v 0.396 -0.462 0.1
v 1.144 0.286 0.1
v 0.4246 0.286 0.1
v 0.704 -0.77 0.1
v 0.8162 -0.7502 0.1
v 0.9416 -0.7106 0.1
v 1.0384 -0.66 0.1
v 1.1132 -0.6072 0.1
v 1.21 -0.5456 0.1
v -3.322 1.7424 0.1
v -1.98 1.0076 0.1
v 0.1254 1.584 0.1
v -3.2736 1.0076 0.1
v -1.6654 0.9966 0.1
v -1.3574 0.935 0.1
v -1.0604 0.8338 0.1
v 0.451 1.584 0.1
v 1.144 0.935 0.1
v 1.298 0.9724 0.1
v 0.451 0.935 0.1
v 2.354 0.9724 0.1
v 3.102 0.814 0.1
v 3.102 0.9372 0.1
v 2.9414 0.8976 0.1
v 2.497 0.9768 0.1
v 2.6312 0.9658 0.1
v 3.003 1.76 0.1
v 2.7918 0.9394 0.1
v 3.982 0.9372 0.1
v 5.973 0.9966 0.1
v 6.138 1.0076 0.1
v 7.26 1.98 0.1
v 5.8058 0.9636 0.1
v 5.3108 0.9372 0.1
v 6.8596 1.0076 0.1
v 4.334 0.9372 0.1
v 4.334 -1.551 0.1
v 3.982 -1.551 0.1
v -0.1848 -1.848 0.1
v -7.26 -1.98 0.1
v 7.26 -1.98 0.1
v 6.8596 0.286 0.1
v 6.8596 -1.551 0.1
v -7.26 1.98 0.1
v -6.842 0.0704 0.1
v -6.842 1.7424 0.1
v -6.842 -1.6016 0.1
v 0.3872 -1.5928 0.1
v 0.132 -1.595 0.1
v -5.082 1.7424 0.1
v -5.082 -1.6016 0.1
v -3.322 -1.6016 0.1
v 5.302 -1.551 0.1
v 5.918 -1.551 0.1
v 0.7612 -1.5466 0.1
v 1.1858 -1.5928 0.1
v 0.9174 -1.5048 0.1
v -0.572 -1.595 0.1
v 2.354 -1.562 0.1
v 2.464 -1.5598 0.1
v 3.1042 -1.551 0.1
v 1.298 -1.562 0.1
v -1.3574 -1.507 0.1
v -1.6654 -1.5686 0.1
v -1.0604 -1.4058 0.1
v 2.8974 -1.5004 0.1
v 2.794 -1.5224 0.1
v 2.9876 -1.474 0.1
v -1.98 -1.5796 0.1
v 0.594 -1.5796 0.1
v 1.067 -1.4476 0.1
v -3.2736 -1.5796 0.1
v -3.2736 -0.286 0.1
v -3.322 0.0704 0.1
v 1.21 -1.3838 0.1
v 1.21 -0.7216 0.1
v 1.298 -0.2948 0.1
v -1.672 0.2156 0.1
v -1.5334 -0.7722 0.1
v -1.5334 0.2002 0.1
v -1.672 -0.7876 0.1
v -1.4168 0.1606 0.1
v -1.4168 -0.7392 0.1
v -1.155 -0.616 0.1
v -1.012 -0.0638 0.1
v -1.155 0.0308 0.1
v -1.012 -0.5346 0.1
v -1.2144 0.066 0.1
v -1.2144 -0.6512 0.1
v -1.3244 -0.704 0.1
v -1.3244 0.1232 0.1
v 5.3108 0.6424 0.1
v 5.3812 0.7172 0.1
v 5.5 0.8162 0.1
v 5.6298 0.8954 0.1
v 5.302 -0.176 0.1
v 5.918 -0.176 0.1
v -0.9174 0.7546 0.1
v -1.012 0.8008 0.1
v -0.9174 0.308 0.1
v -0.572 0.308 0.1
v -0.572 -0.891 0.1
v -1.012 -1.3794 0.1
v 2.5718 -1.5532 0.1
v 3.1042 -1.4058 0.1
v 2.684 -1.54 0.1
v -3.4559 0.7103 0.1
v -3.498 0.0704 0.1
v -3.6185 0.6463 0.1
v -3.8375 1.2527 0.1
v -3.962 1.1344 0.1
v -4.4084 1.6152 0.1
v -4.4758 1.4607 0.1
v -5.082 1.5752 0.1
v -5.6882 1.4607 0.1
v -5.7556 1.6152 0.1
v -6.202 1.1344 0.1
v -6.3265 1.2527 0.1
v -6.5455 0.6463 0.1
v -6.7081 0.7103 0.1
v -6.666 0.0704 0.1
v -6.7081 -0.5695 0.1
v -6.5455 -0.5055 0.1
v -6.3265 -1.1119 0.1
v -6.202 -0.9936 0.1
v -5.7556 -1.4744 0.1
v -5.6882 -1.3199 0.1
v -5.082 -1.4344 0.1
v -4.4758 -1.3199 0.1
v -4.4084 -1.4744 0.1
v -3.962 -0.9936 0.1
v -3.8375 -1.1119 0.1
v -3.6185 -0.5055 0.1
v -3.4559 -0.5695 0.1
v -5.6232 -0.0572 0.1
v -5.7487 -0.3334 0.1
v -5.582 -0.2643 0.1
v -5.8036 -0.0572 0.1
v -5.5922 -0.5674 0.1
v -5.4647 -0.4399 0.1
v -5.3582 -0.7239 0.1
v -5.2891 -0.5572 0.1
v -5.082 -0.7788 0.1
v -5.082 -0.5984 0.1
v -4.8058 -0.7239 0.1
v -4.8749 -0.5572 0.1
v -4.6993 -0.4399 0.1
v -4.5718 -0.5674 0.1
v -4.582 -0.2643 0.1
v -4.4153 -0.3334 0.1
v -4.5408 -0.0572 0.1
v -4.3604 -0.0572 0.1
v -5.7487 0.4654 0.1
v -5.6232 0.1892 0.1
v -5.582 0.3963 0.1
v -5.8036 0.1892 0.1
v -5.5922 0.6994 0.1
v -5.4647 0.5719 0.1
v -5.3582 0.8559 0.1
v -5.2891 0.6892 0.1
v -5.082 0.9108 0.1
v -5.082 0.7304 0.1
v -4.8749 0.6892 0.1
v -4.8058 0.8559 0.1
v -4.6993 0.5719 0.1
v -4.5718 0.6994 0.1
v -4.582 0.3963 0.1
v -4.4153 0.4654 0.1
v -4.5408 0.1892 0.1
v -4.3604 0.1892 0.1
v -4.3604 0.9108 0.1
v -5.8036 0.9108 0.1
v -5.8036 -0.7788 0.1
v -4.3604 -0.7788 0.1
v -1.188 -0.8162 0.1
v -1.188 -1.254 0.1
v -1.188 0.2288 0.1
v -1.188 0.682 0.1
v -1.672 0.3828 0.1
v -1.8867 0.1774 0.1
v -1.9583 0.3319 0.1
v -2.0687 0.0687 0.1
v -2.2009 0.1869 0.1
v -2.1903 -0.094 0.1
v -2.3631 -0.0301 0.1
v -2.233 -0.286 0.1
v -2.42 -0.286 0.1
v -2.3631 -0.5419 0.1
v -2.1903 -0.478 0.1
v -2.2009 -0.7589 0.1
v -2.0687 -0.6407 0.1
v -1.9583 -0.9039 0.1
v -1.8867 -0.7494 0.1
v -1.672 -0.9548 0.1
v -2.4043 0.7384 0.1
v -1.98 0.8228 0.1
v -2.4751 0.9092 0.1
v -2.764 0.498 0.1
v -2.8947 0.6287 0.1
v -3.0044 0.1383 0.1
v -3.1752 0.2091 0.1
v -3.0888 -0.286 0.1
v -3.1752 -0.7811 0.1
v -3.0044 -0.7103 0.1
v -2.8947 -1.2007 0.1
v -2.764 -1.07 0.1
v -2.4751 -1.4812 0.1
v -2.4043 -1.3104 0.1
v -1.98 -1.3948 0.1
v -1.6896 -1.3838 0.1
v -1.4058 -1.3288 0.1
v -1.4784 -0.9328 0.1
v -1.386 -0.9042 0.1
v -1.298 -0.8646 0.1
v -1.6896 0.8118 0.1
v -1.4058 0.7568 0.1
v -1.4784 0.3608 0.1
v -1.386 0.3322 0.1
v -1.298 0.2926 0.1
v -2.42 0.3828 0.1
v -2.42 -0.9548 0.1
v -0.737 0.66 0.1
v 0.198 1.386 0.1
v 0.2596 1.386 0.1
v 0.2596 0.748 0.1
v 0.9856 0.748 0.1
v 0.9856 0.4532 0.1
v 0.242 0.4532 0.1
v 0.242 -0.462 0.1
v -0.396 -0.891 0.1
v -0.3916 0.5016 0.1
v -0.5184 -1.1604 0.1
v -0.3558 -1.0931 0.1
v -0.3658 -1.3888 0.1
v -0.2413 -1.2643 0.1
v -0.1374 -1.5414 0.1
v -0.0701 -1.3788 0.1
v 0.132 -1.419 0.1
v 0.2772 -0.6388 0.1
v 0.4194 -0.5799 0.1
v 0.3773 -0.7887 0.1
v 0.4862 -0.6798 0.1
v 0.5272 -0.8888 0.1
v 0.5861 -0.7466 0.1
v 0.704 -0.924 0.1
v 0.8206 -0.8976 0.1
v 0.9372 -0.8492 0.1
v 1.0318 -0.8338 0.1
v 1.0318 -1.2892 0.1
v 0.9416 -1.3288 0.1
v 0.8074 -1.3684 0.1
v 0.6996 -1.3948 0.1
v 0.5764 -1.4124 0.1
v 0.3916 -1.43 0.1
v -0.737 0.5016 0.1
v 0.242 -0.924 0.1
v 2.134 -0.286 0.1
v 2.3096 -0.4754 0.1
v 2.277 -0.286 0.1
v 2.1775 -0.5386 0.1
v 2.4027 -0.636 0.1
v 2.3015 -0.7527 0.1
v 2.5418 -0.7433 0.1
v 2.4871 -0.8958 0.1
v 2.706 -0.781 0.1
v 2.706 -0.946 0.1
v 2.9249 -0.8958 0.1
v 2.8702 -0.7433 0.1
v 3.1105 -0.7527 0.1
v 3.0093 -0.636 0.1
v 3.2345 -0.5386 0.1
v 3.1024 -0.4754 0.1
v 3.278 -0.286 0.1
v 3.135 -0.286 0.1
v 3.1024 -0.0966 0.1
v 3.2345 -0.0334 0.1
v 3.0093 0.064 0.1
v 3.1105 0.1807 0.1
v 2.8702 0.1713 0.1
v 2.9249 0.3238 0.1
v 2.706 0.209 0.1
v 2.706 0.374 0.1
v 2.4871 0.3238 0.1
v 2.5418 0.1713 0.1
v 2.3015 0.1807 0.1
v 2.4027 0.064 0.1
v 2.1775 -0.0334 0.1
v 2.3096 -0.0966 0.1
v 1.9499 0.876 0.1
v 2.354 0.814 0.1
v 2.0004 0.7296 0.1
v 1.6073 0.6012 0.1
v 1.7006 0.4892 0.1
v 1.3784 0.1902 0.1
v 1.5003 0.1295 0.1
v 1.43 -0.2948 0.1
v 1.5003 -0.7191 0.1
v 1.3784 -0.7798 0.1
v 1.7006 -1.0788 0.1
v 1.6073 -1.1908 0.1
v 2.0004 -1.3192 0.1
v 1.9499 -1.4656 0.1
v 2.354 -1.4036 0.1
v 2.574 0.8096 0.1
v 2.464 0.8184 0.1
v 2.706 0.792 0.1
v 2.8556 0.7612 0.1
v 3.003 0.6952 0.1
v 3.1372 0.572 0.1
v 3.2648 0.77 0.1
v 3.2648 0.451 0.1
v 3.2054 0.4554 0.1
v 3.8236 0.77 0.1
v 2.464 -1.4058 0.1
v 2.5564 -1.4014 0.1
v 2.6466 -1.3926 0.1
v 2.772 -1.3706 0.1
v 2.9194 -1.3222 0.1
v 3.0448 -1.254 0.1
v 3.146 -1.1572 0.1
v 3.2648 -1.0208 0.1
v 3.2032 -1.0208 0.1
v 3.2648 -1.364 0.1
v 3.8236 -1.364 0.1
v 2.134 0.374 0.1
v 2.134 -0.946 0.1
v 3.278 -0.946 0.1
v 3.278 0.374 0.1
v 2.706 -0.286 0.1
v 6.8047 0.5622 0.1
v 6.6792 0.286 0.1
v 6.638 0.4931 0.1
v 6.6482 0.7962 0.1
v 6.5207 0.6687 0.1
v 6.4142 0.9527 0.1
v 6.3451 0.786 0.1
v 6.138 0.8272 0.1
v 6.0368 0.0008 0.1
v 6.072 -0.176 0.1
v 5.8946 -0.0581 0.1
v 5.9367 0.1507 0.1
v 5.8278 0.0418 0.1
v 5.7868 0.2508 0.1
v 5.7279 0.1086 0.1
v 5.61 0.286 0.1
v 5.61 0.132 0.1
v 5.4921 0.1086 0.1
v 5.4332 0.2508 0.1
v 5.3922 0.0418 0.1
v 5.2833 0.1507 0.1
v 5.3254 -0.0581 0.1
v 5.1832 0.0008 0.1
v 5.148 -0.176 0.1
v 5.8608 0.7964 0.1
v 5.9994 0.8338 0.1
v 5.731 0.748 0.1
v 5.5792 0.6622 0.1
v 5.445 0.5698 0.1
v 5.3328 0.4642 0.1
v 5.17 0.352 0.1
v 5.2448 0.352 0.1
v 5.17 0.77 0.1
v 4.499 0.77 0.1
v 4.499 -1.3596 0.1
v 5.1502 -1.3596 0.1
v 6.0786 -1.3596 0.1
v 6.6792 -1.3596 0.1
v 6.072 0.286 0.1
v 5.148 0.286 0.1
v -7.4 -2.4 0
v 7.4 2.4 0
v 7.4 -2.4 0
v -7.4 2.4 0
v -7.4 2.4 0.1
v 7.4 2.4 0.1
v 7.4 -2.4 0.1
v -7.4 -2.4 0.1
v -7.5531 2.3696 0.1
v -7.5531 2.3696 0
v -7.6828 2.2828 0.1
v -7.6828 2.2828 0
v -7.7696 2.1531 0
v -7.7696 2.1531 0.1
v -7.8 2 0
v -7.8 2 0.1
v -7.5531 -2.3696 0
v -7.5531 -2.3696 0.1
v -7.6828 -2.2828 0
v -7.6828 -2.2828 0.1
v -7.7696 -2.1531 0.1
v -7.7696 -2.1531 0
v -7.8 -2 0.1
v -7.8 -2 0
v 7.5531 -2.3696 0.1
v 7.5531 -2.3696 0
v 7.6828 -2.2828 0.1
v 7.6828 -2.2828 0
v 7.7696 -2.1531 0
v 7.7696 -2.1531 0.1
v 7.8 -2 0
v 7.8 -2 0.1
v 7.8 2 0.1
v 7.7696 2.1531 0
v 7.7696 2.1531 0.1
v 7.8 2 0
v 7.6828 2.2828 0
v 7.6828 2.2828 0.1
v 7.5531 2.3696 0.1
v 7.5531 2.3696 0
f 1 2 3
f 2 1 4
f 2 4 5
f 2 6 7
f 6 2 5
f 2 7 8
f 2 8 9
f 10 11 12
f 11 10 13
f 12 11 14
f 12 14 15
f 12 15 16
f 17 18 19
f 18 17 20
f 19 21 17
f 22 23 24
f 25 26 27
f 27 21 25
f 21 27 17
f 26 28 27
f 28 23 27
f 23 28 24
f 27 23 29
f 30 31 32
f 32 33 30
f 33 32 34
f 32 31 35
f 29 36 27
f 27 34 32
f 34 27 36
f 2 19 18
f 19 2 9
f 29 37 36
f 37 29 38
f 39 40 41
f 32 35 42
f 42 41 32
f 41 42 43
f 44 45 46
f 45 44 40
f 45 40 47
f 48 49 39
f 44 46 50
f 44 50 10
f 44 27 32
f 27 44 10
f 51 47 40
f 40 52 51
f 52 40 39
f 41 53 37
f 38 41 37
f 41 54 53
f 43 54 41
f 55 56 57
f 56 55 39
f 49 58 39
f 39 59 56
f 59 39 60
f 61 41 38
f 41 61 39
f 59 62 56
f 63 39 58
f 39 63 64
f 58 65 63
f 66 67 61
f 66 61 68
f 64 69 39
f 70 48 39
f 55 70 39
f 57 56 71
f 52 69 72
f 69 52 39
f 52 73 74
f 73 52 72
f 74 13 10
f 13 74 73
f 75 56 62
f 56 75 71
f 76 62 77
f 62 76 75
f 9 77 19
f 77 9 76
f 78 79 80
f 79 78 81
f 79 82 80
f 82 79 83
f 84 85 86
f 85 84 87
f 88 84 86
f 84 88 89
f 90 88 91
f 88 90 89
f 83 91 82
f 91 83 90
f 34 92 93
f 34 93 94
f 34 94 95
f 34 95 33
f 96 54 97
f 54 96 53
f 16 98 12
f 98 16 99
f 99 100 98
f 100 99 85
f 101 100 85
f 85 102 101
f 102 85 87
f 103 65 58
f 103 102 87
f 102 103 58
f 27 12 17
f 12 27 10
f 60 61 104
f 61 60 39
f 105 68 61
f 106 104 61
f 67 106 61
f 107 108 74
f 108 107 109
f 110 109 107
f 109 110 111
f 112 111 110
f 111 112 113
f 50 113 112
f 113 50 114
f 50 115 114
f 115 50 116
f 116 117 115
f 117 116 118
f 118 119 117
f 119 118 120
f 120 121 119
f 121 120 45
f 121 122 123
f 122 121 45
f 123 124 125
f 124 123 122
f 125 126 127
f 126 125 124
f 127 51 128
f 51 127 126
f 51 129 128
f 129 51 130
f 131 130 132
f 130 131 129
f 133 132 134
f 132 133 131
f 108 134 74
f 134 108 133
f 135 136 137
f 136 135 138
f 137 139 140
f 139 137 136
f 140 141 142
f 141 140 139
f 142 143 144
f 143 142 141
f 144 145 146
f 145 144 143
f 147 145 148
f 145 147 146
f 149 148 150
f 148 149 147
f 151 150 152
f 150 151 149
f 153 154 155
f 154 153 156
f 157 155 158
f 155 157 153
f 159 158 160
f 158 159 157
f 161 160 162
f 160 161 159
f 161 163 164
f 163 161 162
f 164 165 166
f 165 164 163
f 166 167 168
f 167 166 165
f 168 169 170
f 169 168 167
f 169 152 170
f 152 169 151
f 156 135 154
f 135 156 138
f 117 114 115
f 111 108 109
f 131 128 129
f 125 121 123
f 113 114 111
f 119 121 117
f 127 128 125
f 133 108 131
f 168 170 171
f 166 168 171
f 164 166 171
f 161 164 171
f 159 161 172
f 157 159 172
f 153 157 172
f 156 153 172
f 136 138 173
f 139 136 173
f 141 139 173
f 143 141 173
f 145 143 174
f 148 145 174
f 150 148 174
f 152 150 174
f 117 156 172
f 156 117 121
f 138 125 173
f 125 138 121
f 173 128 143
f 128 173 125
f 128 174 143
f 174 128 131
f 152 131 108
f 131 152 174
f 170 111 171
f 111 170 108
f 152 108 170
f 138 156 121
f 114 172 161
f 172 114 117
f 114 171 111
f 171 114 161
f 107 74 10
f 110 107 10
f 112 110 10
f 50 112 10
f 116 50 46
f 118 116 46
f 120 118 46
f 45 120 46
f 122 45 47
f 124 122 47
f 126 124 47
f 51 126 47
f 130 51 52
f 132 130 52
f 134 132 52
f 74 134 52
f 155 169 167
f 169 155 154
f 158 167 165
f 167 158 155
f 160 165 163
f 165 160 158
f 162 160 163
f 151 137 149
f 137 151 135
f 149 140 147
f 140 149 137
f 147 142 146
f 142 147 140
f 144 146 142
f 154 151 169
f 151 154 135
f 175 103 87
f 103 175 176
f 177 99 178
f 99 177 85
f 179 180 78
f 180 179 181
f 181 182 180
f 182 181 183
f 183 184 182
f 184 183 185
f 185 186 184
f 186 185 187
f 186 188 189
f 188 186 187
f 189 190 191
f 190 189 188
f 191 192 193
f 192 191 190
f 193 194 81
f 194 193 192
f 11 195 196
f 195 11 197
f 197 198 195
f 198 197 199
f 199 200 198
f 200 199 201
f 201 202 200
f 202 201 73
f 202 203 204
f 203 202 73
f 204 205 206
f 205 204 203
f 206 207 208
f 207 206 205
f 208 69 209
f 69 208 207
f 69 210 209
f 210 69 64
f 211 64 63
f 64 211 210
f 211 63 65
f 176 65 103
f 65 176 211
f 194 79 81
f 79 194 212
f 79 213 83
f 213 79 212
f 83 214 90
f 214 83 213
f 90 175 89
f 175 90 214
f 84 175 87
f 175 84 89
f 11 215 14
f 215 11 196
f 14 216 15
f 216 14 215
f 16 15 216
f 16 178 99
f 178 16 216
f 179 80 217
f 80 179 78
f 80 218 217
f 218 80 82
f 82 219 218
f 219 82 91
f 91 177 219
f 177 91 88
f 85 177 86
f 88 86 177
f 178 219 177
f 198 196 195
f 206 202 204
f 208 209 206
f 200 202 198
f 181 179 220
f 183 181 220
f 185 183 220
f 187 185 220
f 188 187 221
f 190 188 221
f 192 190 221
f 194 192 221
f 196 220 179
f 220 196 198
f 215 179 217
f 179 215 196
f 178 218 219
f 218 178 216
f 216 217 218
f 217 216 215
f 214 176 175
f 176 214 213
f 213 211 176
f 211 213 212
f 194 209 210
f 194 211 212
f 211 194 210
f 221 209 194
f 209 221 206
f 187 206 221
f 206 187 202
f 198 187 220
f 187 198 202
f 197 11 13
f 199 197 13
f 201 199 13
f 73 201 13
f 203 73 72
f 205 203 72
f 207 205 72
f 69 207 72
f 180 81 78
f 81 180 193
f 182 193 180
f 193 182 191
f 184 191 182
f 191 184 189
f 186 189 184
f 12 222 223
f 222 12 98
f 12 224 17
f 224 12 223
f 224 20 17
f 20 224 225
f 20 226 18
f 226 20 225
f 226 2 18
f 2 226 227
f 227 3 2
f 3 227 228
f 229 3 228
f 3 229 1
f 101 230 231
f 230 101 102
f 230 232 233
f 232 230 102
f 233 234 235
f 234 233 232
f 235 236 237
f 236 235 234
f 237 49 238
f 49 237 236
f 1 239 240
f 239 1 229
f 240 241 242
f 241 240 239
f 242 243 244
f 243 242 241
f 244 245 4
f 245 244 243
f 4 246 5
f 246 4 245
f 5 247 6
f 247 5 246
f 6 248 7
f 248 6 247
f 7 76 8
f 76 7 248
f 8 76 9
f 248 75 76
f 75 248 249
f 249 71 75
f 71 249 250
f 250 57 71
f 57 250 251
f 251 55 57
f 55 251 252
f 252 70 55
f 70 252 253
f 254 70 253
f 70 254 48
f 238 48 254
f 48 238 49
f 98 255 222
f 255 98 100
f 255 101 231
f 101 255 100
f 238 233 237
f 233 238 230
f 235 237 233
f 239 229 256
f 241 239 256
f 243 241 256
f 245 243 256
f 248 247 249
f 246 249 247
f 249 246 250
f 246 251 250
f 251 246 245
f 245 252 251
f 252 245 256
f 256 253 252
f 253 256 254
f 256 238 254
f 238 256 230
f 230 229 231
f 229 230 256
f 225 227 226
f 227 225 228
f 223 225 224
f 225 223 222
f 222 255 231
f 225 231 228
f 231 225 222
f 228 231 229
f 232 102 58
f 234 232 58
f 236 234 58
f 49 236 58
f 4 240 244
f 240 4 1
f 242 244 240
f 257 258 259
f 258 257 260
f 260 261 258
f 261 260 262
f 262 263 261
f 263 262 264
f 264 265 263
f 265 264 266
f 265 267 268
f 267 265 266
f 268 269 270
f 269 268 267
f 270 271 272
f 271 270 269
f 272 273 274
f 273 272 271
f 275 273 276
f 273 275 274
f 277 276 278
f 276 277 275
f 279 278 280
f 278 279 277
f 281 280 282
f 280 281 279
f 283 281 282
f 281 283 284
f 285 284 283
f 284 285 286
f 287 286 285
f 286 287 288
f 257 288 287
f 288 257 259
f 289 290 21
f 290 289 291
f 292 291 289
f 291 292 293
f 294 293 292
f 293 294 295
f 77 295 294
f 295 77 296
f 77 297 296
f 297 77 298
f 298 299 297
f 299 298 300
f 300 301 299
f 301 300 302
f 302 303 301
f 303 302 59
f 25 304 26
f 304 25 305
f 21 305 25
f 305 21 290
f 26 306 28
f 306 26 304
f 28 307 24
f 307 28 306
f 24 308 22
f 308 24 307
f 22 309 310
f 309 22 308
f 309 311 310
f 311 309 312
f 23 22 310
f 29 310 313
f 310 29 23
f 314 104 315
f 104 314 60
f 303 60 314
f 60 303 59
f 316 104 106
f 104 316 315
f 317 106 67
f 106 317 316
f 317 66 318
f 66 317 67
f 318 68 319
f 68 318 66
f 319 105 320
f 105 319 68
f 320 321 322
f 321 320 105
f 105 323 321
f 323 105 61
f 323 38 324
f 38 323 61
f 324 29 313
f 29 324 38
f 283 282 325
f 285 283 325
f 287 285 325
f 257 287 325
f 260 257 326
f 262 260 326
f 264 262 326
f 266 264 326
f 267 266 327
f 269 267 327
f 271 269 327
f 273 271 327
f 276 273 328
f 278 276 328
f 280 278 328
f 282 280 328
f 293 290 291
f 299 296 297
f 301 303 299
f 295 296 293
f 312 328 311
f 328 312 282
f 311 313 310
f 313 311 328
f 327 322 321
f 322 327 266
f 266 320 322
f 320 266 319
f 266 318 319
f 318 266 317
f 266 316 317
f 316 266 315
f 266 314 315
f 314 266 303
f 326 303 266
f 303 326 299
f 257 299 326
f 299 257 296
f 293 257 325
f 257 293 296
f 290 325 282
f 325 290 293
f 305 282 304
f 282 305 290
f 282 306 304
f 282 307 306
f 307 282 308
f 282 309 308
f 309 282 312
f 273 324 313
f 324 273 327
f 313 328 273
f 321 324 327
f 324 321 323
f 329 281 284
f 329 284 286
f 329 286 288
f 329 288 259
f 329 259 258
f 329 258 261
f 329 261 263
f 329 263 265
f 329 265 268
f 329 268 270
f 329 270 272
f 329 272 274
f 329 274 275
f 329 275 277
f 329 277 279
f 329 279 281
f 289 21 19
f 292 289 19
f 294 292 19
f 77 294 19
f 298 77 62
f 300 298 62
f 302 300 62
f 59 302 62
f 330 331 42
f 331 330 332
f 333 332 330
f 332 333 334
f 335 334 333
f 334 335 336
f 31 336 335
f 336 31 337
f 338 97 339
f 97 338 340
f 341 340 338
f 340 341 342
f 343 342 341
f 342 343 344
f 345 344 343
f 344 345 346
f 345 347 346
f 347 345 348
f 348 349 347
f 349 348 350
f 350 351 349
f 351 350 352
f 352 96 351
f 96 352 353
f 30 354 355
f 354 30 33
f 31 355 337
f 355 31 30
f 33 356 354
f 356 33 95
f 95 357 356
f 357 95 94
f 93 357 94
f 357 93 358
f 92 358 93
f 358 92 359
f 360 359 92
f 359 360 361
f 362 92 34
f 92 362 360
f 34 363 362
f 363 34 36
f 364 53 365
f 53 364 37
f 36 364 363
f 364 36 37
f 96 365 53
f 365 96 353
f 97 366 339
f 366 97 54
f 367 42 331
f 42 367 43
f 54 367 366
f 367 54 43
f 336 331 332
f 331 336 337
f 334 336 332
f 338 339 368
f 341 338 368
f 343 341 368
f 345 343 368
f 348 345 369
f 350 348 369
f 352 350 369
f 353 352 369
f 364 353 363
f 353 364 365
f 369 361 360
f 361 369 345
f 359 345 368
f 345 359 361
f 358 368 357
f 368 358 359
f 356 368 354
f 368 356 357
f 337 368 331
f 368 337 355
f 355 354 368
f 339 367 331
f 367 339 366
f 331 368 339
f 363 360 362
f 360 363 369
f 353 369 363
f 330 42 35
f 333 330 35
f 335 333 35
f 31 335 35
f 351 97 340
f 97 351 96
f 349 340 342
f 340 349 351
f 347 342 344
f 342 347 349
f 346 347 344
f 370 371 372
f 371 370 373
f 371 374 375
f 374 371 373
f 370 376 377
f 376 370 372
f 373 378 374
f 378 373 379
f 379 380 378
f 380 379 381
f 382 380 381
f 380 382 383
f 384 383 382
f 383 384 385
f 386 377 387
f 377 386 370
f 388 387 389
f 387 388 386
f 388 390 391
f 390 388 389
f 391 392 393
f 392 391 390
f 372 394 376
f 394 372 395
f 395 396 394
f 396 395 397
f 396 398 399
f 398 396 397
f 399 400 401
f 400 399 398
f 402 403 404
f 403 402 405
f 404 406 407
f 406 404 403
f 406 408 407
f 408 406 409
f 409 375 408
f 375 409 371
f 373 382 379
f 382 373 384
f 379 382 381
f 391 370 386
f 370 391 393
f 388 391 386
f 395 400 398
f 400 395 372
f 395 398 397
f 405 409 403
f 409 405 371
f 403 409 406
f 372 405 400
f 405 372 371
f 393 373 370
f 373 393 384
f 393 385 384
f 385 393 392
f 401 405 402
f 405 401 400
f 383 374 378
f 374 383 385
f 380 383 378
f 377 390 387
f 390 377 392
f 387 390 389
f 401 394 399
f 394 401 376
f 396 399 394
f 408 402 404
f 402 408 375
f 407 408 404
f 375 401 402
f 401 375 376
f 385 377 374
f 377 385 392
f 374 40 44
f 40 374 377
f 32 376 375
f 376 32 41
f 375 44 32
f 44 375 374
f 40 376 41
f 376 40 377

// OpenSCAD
use <../lib.scad>
use <../p/1-4chrd.scad>
use <../p/1-4cyli.scad>
use <../p/box3u12.scad>
use <../p/logo-octantext.scad>
$fa=1; $fs=0.2;
function ldraw_lib__4121723l(realsolid=false) = [
// 0 Sticker  0.65 x  1.95 with "Octan" Lettering with Medium-Bold Borders
// 0 Name: 4121723l.dat
// 0 Author: Ulrich Röder [UR]
// 0 !LDRAW_ORG Part UPDATE 2022-02
// 0 !LICENSE Licensed under CC BY 2.0 and CC BY 4.0 : see CAreadme.txt
// 
// 0 BFC CERTIFY CCW
  [0,"BFC","CERTIFY"],
  [0,"BFC","CCW"],
// 
// 0 !KEYWORDS Model Team, Racing Truck, Set 5563
// 
// 0 !HISTORY 2022-03-06 [PTadmin] Official Update 2022-02
// 
// 
// 1 16 0 -.25 0 0.55 0 0 0 1 0 0 0 0.55 logo-octantext.dat
  [1,16,0,-.25,0,0.55,0,0,0,1,0,0,0,0.55, ldraw_lib__logo_octantext(realsolid)],
// 
// 0 // Body
// 1 16 0 -0.25 0 18.5 0 0 0 0.25 0 0 0 6 box3u12.dat
  [1,16,0,-0.25,0,18.5,0,0,0,0.25,0,0,0,6, ldraw_lib__box3u12(realsolid)],
// 1 16 -18.5 0 5 0 0 -1 0 -.25 0 1 0 0 1-4cyli.dat
  [1,16,-18.5,0,5,0,0,-1,0,-.25,0,1,0,0, ldraw_lib__1_4cyli(realsolid)],
// 1 16 -18.5 0 -5 0 0 -1 0 -.25 0 -1 0 0 1-4cyli.dat
  [1,16,-18.5,0,-5,0,0,-1,0,-.25,0,-1,0,0, ldraw_lib__1_4cyli(realsolid)],
// 1 16 18.5 0 -5 0 0 1 0 -.25 0 -1 0 0 1-4cyli.dat
  [1,16,18.5,0,-5,0,0,1,0,-.25,0,-1,0,0, ldraw_lib__1_4cyli(realsolid)],
// 1 16 18.5 0 5 1 0 0 0 -.25 0 0 0 1 1-4cyli.dat
  [1,16,18.5,0,5,1,0,0,0,-.25,0,0,0,1, ldraw_lib__1_4cyli(realsolid)],
// 1 16 -18.5 0 5 0 0 -1 0 -1 0 1 0 0 1-4chrd.dat
  [1,16,-18.5,0,5,0,0,-1,0,-1,0,1,0,0, ldraw_lib__1_4chrd(realsolid)],
// 1 16 -18.5 0 -5 0 0 -1 0 -1 0 -1 0 0 1-4chrd.dat
  [1,16,-18.5,0,-5,0,0,-1,0,-1,0,-1,0,0, ldraw_lib__1_4chrd(realsolid)],
// 1 16 18.5 0 -5 0 0 1 0 -1 0 -1 0 0 1-4chrd.dat
  [1,16,18.5,0,-5,0,0,1,0,-1,0,-1,0,0, ldraw_lib__1_4chrd(realsolid)],
// 1 16 18.5 0 5 1 0 0 0 -1 0 0 0 1 1-4chrd.dat
  [1,16,18.5,0,5,1,0,0,0,-1,0,0,0,1, ldraw_lib__1_4chrd(realsolid)],
// 4 16 18.5 0 6 19.5 0 5 19.5 0 -5 18.5 0 -6
  [4,16,18.5,0,6,19.5,0,5,19.5,0,-5,18.5,0,-6],
// 4 16 -18.5 0 -6 -19.5 0 -5 -19.5 0 5 -18.5 0 6
  [4,16,-18.5,0,-6,-19.5,0,-5,-19.5,0,5,-18.5,0,6],
// 4 16 -19.5 -.25 5 -19.5 0 5 -19.5 0 -5 -19.5 -.25 -5
  [4,16,-19.5,-.25,5,-19.5,0,5,-19.5,0,-5,-19.5,-.25,-5],
// 4 16 19.5 0 -5 19.5 0 5 19.5 -.25 5 19.5 -.25 -5
  [4,16,19.5,0,-5,19.5,0,5,19.5,-.25,5,19.5,-.25,-5],
// 
// 0 // Frontface
// 1 16 -18.5 -.25 5 0 0 -1 0 1 0 1 0 0 1-4chrd.dat
  [1,16,-18.5,-.25,5,0,0,-1,0,1,0,1,0,0, ldraw_lib__1_4chrd(realsolid)],
// 1 16 -18.5 -.25 -5 0 0 -1 0 1 0 -1 0 0 1-4chrd.dat
  [1,16,-18.5,-.25,-5,0,0,-1,0,1,0,-1,0,0, ldraw_lib__1_4chrd(realsolid)],
// 1 16 18.5 -.25 -5 0 0 1 0 1 0 -1 0 0 1-4chrd.dat
  [1,16,18.5,-.25,-5,0,0,1,0,1,0,-1,0,0, ldraw_lib__1_4chrd(realsolid)],
// 1 16 18.5 -.25 5 1 0 0 0 1 0 0 0 1 1-4chrd.dat
  [1,16,18.5,-.25,5,1,0,0,0,1,0,0,0,1, ldraw_lib__1_4chrd(realsolid)],
// 4 16 19.5 -.25 -5 19.5 -.25 5 18.5 -.25 6 18.5 -.25 -6
  [4,16,19.5,-.25,-5,19.5,-.25,5,18.5,-.25,6,18.5,-.25,-6],
// 4 16 -19.5 -.25 5 -19.5 -.25 -5 -18.5 -.25 -6 -18.5 -.25 6
  [4,16,-19.5,-.25,5,-19.5,-.25,-5,-18.5,-.25,-6,-18.5,-.25,6],
// 4 16 -18.5 -.25 -6 -18.15 -.25 -4.95 -18.15 -.25 4.95 -18.5 -.25 6
  [4,16,-18.5,-.25,-6,-18.15,-.25,-4.95,-18.15,-.25,4.95,-18.5,-.25,6],
// 4 16 18.15 -.25 4.95 18.15 -.25 -4.95 18.5 -.25 -6 18.5 -.25 6
  [4,16,18.15,-.25,4.95,18.15,-.25,-4.95,18.5,-.25,-6,18.5,-.25,6],
// 4 16 -18.5 -.25 6 -18.15 -.25 4.95 18.15 -.25 4.95 18.5 -.25 6
  [4,16,-18.5,-.25,6,-18.15,-.25,4.95,18.15,-.25,4.95,18.5,-.25,6],
// 4 16 -18.5 -.25 -6 18.5 -.25 -6 18.15 -.25 -4.95 -18.15 -.25 -4.95
  [4,16,-18.5,-.25,-6,18.5,-.25,-6,18.15,-.25,-4.95,-18.15,-.25,-4.95],
];
module ldraw_lib__4121723l(step=0, col=false, unit=2/5, alt=false, line=0.2, solid=!$preview)
    makepoly(ldraw_lib__4121723l(solid), step=step, col=col, unit=unit, alt=alt, line=line, solid=solid);
ldraw_lib__4121723l(line=0.2);
